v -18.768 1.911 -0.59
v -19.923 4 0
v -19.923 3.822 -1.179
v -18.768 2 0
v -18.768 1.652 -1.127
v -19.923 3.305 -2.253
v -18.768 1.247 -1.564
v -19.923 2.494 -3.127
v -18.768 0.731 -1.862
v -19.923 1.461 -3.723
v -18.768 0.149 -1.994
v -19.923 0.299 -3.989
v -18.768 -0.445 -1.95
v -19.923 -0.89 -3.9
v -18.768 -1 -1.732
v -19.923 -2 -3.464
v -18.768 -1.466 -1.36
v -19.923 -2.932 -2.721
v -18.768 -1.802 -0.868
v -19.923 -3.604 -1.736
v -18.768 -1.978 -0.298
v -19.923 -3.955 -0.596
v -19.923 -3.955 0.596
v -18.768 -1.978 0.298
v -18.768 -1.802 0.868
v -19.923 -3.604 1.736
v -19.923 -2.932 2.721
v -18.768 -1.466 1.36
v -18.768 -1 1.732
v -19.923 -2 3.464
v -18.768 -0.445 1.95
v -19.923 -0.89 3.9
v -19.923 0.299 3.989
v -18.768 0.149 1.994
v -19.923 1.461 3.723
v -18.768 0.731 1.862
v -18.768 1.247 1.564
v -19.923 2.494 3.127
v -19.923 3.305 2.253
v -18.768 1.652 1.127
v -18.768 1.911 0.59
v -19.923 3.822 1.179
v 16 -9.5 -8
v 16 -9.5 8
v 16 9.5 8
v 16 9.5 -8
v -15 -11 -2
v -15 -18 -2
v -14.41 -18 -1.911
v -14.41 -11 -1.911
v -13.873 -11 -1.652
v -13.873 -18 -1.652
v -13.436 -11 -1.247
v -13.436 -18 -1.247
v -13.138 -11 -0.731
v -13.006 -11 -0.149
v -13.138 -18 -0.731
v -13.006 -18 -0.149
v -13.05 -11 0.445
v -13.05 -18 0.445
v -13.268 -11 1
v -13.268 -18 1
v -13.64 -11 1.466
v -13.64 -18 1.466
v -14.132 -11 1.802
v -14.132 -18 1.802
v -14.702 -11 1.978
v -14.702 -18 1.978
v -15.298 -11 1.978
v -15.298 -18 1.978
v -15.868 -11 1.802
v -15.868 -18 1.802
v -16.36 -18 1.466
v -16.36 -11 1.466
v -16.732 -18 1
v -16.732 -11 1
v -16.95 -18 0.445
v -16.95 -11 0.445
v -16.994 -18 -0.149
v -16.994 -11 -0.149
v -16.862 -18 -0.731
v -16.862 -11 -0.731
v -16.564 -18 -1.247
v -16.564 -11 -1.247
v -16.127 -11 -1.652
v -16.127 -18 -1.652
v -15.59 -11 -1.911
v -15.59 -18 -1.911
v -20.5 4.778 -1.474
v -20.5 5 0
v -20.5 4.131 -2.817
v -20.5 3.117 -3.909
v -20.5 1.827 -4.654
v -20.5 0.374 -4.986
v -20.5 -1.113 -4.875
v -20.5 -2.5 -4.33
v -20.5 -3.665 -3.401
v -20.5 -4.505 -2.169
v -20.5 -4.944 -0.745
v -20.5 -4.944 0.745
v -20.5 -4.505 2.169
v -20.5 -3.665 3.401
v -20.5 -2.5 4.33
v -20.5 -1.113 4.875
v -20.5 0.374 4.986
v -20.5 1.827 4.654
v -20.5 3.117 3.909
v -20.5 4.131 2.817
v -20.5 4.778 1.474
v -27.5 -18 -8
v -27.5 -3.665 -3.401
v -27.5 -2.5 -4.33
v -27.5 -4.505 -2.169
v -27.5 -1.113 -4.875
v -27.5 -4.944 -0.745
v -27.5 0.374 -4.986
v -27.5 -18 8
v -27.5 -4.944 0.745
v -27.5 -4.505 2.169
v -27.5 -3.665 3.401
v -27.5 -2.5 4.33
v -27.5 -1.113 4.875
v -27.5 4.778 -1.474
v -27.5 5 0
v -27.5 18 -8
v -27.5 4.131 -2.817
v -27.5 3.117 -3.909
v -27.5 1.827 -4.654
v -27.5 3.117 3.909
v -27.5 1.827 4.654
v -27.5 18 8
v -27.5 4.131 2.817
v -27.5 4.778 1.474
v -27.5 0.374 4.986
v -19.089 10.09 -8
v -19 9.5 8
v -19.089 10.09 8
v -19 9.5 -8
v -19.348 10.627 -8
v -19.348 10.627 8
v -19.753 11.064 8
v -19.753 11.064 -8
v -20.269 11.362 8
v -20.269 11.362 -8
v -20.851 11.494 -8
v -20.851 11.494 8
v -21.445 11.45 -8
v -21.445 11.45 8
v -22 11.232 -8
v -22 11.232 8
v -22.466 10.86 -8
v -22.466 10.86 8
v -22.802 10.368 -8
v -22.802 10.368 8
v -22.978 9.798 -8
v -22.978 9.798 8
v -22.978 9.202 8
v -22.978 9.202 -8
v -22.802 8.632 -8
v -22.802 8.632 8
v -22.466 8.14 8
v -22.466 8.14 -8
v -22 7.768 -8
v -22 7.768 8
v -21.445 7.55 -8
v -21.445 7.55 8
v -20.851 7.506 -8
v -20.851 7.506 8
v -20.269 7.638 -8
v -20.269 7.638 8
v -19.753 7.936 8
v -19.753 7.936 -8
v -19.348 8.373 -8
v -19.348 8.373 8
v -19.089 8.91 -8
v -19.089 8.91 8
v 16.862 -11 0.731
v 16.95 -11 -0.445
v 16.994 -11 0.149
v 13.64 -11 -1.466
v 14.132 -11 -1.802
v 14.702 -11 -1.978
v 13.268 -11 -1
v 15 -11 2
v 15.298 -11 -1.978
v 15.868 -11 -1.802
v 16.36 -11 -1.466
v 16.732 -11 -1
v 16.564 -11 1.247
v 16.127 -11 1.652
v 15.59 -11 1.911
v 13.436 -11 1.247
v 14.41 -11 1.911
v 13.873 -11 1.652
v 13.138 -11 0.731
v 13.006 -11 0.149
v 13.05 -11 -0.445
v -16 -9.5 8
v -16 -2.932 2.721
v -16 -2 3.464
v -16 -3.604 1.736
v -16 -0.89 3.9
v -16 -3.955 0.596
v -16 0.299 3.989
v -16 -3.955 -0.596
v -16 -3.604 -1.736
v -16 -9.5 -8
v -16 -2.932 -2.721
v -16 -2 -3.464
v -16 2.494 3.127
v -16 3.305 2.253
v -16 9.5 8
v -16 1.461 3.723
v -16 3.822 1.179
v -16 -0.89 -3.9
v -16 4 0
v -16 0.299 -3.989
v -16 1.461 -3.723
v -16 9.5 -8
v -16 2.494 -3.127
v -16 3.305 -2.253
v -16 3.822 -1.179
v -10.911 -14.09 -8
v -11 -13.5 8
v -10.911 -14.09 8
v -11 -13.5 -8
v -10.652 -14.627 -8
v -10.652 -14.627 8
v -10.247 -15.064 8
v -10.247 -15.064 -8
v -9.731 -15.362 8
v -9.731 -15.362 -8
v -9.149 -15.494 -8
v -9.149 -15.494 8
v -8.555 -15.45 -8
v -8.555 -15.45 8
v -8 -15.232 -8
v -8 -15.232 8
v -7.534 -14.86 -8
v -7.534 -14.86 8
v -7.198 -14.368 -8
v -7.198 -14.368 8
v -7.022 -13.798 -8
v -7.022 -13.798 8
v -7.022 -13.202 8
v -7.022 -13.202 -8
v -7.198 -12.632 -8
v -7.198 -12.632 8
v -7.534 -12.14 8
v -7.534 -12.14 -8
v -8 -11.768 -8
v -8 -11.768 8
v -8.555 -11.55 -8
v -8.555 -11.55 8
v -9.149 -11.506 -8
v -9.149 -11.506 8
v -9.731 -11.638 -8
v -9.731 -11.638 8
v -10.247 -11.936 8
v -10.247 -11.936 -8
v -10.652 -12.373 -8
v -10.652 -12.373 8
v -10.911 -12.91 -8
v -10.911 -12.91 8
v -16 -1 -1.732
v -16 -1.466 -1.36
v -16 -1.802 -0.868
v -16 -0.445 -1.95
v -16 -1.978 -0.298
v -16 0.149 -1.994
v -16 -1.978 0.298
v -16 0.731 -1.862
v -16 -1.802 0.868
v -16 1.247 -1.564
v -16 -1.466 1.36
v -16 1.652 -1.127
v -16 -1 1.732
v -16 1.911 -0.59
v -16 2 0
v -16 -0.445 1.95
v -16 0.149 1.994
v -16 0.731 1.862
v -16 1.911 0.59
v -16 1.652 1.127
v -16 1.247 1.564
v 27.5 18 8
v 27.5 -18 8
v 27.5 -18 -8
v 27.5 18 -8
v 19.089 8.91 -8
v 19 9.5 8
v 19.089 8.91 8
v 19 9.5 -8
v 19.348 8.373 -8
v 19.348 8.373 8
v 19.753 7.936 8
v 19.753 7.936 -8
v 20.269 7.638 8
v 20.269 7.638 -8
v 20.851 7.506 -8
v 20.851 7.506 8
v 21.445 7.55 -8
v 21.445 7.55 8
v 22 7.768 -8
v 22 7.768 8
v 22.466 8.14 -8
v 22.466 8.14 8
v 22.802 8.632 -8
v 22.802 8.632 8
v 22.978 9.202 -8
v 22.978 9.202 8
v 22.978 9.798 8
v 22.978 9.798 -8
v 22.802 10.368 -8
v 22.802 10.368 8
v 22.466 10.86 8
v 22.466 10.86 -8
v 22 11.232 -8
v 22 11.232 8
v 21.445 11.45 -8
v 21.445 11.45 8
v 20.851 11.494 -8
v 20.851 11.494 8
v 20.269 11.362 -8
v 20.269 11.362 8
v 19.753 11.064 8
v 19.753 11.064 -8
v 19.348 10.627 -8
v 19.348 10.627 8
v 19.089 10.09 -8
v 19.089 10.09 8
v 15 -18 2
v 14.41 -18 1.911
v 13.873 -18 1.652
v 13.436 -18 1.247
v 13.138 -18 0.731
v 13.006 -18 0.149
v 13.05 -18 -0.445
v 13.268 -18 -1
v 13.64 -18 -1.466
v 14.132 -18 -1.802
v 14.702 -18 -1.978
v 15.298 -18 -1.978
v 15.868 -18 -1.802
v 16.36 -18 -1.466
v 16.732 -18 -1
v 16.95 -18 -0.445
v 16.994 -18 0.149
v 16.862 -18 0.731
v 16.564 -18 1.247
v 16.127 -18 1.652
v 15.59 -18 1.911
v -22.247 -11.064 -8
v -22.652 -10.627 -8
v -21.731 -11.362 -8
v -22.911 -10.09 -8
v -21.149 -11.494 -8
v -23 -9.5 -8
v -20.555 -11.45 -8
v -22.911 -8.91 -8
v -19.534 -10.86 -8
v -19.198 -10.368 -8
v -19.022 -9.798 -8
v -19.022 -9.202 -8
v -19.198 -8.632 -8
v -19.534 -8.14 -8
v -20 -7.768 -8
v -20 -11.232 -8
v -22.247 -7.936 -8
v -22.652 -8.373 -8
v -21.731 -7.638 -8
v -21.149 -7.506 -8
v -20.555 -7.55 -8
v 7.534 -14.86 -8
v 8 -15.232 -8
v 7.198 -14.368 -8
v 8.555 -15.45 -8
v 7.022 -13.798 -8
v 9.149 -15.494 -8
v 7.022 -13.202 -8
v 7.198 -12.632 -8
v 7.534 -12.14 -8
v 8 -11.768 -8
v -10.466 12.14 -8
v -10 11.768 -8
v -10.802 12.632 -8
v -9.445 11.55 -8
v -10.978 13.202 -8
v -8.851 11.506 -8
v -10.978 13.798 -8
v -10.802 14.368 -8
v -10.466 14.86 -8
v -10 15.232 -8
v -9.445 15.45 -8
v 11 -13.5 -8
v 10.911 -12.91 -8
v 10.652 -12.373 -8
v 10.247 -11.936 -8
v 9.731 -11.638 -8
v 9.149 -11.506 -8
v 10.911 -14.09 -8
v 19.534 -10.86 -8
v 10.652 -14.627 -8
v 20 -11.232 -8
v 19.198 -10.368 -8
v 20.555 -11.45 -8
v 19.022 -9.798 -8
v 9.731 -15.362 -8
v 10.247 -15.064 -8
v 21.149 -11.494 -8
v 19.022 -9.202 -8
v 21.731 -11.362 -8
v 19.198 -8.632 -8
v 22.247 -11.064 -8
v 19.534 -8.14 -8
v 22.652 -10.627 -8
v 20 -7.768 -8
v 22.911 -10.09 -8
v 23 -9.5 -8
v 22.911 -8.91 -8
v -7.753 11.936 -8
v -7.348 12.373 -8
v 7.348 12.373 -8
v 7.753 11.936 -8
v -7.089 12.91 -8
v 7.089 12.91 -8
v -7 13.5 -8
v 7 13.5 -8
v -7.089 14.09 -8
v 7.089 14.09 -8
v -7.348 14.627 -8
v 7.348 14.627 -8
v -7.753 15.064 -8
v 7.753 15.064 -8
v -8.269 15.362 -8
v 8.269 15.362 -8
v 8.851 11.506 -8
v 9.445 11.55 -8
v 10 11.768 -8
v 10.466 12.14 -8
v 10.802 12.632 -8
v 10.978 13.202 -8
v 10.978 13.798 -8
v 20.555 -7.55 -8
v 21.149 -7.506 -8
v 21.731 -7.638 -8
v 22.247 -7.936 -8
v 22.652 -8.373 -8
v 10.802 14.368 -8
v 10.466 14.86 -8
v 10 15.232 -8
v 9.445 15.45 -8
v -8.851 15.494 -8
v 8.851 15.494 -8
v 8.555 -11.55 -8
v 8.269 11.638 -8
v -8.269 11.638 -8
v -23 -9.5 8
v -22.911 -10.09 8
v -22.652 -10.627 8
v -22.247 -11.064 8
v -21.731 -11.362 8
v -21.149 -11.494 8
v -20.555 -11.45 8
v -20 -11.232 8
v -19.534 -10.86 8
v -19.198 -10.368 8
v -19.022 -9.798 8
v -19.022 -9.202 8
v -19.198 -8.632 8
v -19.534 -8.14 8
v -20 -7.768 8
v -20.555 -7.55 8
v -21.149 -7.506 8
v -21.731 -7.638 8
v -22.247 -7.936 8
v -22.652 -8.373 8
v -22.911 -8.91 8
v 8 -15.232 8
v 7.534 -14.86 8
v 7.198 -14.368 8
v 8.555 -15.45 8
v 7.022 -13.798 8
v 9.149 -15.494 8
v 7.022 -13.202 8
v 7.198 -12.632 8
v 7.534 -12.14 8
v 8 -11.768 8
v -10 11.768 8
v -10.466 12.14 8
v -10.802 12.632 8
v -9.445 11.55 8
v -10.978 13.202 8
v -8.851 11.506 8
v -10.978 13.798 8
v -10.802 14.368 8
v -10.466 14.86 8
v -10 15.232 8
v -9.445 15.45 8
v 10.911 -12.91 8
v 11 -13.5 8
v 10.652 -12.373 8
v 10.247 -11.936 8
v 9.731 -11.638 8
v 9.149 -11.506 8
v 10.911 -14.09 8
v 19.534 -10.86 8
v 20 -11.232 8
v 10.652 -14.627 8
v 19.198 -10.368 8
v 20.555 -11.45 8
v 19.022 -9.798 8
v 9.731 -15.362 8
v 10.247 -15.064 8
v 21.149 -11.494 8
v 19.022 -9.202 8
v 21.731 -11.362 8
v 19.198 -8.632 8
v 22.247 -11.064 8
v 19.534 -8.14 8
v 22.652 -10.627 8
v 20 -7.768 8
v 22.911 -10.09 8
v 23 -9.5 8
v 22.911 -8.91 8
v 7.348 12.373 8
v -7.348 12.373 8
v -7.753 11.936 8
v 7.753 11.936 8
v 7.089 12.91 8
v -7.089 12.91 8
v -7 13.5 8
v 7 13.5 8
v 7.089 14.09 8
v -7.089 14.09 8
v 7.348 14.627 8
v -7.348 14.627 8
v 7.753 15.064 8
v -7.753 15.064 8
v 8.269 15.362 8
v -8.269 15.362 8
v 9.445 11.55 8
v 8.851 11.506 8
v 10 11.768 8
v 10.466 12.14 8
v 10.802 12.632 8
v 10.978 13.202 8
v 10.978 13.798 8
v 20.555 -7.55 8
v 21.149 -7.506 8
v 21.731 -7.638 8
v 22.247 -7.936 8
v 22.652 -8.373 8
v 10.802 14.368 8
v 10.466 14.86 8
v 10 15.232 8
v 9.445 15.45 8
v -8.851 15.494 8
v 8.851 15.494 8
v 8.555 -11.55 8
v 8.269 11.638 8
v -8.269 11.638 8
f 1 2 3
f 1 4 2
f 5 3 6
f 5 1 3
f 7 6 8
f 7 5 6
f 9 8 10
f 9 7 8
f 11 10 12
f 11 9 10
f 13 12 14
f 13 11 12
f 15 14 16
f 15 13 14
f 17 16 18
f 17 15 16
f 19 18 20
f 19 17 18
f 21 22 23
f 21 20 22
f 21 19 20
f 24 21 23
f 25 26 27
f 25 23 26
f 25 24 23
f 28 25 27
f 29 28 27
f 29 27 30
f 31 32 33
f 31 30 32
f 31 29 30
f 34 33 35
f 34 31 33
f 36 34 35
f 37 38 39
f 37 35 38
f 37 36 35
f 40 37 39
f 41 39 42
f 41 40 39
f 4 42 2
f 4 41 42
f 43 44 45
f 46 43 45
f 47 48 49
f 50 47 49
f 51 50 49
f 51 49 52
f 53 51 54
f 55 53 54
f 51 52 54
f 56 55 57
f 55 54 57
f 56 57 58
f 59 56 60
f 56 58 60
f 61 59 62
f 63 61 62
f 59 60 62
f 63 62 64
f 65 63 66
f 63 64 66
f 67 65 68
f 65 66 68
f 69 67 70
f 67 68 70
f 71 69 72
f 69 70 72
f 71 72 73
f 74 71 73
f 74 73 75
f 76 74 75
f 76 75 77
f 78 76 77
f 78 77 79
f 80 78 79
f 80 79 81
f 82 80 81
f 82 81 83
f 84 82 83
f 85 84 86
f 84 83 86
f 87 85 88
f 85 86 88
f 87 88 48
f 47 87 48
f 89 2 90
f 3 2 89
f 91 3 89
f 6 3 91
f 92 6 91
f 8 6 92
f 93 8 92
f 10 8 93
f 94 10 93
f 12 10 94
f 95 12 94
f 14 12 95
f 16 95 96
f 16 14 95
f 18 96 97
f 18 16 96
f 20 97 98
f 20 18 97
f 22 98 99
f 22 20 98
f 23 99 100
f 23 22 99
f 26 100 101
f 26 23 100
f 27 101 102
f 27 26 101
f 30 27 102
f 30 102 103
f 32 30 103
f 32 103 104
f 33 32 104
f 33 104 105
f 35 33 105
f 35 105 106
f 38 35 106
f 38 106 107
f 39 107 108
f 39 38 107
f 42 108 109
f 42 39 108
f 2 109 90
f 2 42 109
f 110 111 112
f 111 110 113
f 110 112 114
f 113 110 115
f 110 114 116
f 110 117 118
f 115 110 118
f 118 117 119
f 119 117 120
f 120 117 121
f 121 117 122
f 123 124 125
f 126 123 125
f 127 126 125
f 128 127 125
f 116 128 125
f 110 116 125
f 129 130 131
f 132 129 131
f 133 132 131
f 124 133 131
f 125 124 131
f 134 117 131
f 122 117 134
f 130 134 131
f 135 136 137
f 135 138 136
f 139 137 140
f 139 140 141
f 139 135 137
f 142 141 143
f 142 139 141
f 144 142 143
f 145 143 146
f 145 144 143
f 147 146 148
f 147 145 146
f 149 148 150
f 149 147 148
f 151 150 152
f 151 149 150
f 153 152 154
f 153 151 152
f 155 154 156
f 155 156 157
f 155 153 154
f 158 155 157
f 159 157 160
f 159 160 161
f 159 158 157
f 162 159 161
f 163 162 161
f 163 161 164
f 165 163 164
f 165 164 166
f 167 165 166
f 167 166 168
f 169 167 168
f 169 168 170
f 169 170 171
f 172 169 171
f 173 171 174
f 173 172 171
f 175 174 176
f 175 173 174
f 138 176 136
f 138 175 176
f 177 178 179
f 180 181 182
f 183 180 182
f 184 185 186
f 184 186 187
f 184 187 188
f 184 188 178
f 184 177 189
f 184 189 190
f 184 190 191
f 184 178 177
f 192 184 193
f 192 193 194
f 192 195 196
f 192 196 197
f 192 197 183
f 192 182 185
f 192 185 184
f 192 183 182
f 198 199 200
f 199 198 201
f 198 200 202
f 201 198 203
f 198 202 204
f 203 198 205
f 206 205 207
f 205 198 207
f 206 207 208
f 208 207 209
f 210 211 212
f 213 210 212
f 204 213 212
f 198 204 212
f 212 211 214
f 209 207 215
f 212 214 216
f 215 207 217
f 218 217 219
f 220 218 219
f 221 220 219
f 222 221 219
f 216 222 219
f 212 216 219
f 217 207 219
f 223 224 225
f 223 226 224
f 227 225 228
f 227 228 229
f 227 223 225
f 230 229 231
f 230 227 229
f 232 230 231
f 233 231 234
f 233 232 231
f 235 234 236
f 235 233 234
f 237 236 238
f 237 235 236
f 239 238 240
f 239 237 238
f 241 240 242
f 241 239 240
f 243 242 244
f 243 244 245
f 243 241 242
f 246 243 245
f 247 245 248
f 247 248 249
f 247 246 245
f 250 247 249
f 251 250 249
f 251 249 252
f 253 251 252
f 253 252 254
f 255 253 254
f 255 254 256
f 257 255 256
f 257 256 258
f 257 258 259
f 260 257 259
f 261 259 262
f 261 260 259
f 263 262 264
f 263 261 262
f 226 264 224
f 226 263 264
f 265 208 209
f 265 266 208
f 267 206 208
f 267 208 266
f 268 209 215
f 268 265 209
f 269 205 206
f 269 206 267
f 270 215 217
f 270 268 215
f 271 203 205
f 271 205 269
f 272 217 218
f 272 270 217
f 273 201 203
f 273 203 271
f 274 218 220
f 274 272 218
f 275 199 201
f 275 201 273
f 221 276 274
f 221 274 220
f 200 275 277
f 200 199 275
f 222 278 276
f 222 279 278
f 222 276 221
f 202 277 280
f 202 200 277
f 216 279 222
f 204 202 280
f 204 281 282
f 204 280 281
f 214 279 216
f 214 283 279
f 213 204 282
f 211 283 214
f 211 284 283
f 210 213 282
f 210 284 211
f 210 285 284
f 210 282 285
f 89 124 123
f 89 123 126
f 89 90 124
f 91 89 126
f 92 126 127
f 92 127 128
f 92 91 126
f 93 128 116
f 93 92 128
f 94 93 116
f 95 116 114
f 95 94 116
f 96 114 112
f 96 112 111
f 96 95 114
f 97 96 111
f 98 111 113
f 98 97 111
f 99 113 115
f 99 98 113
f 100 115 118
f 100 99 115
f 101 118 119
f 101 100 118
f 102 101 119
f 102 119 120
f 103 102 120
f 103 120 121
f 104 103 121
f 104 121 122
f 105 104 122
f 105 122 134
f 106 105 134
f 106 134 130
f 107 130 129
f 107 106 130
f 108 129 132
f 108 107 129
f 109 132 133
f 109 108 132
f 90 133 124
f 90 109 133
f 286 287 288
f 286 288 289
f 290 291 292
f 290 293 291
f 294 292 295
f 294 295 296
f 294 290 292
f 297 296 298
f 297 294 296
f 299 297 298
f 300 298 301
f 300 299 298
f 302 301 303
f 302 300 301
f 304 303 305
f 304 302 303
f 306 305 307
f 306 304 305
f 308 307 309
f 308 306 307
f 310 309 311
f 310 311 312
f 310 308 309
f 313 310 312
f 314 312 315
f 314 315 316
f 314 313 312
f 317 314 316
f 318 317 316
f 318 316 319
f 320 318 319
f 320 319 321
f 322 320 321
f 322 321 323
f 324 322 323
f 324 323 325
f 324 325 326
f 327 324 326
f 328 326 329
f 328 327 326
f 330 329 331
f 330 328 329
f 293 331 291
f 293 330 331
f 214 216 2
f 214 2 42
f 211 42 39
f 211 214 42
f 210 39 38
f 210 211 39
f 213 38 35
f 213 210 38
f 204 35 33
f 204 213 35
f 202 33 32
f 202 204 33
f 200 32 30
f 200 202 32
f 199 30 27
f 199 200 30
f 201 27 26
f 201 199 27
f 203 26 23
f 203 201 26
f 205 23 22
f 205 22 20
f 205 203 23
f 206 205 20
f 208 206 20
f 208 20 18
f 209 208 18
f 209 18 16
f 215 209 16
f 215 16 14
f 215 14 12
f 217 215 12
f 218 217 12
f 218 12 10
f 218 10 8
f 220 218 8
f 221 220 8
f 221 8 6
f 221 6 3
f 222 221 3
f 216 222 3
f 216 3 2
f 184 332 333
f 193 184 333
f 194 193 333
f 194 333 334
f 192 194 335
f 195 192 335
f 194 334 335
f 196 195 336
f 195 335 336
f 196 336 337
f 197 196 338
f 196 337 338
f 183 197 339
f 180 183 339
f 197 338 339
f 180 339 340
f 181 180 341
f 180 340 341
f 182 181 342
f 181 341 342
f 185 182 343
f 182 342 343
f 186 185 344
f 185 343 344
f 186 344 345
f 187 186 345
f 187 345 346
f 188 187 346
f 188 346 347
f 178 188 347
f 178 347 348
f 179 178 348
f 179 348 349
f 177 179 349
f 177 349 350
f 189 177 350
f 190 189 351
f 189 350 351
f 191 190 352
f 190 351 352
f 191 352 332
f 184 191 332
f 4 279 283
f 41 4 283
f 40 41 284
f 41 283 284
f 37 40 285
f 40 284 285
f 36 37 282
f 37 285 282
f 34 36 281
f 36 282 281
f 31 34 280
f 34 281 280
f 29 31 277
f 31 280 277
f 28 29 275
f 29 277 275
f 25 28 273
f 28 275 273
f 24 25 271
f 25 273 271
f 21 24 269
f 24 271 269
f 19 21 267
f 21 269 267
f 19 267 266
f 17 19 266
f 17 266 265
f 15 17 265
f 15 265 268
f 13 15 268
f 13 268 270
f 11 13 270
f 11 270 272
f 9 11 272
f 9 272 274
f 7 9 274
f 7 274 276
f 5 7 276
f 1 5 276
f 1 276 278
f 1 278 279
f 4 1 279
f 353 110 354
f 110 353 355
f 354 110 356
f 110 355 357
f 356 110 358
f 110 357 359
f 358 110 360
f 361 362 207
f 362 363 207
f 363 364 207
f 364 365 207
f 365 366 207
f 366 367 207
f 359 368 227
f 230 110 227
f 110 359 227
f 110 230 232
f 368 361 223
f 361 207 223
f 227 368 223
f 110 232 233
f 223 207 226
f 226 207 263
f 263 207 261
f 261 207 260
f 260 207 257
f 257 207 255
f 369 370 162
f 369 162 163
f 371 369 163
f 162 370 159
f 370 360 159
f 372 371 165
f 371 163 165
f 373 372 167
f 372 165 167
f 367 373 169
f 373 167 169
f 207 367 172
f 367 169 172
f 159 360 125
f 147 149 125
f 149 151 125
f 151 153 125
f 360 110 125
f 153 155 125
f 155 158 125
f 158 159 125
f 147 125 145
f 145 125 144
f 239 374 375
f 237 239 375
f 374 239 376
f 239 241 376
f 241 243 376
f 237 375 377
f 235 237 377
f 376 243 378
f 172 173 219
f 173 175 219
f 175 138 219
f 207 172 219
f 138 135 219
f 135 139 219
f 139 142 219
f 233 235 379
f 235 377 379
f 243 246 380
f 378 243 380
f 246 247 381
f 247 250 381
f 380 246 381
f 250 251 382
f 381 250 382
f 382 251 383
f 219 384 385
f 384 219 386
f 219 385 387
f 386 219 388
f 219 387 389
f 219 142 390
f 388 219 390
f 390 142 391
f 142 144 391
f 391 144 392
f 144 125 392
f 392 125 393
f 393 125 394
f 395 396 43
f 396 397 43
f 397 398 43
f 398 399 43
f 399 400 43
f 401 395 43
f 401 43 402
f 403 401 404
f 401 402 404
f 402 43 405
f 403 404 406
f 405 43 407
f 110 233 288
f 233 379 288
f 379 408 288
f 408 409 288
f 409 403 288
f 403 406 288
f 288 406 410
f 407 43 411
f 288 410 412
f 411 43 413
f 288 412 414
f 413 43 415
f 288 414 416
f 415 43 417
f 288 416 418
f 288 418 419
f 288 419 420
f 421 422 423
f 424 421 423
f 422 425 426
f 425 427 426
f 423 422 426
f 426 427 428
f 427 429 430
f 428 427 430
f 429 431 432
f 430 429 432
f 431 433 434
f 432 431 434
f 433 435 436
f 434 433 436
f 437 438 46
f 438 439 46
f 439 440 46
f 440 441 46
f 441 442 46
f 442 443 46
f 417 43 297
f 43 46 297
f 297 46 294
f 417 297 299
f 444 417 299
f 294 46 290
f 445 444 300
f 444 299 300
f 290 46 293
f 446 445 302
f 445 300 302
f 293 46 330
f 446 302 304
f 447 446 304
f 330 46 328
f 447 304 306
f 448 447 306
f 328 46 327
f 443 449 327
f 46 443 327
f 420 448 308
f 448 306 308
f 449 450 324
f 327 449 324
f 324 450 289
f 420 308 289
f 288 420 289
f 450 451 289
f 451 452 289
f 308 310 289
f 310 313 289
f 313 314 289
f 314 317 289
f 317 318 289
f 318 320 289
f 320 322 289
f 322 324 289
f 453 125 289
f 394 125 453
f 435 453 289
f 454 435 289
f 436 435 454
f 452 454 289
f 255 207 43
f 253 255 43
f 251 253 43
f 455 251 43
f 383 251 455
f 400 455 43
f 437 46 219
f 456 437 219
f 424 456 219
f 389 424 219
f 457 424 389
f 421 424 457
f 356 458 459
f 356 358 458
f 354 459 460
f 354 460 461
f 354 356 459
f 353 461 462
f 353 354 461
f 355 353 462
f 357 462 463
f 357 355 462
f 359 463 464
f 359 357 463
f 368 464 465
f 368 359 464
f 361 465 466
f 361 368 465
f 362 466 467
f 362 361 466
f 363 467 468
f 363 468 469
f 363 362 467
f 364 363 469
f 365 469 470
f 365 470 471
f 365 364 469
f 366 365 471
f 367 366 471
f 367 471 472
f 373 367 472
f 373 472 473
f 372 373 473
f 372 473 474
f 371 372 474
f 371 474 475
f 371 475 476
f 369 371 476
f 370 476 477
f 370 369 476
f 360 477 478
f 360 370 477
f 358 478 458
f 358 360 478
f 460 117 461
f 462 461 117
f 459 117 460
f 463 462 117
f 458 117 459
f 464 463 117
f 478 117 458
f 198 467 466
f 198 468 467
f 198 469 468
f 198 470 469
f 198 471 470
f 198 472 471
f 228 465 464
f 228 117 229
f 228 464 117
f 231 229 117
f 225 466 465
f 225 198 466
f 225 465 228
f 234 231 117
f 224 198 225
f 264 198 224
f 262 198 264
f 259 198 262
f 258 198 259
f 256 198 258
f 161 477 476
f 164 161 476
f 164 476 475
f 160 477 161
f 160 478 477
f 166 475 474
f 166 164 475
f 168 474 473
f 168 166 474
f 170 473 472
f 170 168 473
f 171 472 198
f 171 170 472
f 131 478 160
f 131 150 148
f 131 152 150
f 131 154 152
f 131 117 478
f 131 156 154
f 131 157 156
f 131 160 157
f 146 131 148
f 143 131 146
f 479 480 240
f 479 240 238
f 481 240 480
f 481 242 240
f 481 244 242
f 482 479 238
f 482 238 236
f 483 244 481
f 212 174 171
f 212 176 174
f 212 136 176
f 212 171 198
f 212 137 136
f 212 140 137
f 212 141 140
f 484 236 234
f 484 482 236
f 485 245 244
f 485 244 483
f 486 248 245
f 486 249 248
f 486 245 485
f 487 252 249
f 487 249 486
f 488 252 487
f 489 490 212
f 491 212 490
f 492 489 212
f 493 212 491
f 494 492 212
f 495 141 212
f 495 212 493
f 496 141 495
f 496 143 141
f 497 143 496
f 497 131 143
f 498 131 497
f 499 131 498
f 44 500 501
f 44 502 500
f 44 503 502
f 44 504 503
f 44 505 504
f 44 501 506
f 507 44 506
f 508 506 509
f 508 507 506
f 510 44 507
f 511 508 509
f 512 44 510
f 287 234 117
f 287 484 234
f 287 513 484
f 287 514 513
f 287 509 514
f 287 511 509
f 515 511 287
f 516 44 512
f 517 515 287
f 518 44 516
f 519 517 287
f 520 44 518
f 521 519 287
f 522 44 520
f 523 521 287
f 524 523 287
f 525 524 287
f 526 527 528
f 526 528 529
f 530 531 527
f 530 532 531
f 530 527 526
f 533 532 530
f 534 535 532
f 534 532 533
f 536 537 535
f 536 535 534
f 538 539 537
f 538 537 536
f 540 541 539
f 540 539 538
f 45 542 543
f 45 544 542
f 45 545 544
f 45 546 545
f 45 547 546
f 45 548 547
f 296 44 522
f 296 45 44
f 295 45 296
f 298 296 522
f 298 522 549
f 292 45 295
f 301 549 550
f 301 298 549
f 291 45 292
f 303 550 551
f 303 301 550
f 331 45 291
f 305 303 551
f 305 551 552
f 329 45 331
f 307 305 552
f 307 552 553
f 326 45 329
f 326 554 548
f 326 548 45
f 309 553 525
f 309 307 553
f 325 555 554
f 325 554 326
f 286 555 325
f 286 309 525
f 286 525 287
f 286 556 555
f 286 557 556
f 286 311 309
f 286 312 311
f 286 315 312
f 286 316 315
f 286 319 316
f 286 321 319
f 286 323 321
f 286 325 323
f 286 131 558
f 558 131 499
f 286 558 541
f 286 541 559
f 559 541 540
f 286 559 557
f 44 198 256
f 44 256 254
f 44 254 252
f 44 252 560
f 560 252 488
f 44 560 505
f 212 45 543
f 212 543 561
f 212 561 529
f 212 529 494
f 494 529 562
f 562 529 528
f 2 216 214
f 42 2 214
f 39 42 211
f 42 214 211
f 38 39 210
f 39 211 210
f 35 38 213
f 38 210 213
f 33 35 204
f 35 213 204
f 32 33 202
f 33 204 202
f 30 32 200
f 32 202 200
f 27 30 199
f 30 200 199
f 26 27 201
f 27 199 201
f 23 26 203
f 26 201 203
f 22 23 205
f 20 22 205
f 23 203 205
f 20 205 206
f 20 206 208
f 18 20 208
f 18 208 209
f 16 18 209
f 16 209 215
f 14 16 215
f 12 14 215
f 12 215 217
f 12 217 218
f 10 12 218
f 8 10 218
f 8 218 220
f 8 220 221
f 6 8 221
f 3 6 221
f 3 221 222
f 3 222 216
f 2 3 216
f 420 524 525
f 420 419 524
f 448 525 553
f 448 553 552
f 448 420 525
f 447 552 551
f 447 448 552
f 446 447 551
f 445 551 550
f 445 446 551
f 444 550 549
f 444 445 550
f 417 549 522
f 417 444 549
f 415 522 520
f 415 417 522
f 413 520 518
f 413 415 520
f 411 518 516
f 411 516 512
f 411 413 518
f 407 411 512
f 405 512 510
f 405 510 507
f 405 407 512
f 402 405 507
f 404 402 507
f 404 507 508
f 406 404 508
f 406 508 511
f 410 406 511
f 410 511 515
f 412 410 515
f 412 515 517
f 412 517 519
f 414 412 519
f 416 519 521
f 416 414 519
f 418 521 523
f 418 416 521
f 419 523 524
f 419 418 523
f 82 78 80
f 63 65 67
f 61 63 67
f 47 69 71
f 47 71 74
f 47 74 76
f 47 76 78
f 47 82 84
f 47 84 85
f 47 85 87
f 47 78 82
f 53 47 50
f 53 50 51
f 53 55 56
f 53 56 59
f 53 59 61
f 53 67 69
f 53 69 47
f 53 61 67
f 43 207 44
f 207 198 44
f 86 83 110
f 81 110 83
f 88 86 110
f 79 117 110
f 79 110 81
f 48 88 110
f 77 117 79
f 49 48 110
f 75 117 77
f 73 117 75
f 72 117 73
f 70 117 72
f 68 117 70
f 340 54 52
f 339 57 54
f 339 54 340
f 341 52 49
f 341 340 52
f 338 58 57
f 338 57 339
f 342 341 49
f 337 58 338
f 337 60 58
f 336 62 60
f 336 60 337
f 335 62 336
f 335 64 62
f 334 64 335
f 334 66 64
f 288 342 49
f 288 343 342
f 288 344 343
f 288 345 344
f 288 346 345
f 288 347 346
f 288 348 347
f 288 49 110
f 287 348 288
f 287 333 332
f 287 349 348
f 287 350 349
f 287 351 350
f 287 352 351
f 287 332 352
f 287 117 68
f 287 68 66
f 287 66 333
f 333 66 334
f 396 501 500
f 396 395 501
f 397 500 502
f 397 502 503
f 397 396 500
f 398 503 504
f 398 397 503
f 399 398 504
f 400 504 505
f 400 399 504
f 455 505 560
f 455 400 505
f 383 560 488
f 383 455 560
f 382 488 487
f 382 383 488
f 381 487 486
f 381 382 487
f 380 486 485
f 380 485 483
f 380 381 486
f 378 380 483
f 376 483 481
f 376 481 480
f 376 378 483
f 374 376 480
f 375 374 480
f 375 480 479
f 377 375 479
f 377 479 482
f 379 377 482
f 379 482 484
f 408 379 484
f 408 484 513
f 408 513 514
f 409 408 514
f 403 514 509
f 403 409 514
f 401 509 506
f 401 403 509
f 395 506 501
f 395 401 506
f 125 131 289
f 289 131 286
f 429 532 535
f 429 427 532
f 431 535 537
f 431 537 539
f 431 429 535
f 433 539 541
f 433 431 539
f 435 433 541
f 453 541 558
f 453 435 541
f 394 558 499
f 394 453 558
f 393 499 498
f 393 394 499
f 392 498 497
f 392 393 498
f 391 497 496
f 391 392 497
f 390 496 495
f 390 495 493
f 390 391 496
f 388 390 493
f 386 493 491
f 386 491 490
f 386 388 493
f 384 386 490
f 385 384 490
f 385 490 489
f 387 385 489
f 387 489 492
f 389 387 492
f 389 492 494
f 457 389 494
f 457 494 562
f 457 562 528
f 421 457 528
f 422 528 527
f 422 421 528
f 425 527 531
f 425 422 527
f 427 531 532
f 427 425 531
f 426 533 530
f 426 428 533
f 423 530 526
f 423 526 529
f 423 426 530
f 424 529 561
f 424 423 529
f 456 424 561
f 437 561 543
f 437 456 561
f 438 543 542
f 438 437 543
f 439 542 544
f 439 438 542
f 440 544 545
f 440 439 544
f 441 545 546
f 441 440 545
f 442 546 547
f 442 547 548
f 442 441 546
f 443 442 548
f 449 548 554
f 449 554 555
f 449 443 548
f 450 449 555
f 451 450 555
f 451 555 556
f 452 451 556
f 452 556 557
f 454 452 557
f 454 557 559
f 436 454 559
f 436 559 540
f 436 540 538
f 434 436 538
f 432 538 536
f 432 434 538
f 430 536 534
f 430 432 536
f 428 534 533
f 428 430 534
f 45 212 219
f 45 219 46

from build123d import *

# Parameters (mm, degrees)
SKETCH1_W           = 55
SKETCH1_H           = 36
SKETCH1_R           = 2
SKETCH1_W_2         = 32
SKETCH1_H_2         = 19
BOSS_EXTRUDE1_DEPTH = 8
SKETCH2_R           = 2
CUT_EXTRUDE1_DEPTH  = 7
SKETCH3_R           = 4
CUT_EXTRUDE2_DEPTH  = 48.75196331
SKETCH3_5_R         = 4
SKETCH3_5_R_2       = 2
BOSS_EXTRUDE2_DEPTH = 4.5


with BuildPart() as part:
    # Sketch1 → Boss-Extrude1 (new, symmetric)
    with BuildSketch(Plane.XY):
        Rectangle(SKETCH1_W, SKETCH1_H)
        with Locations((-21, 9.5)):
            Circle(SKETCH1_R, mode=Mode.SUBTRACT)
        with Locations((-9, 13.5)):
            Circle(SKETCH1_R, mode=Mode.SUBTRACT)
        with Locations((-21, -9.5)):
            Circle(SKETCH1_R, mode=Mode.SUBTRACT)
        with Locations((-9, -13.5)):
            Circle(SKETCH1_R, mode=Mode.SUBTRACT)
        with Locations((9, -13.5)):
            Circle(SKETCH1_R, mode=Mode.SUBTRACT)
        with Locations((21, -9.5)):
            Circle(SKETCH1_R, mode=Mode.SUBTRACT)
        with Locations((9, 13.5)):
            Circle(SKETCH1_R, mode=Mode.SUBTRACT)
        with Locations((21, 9.5)):
            Circle(SKETCH1_R, mode=Mode.SUBTRACT)
        Rectangle(SKETCH1_W_2, SKETCH1_H_2, mode=Mode.SUBTRACT)
    extrude(amount=BOSS_EXTRUDE1_DEPTH, both=True)

    # Sketch2 → Cut-Extrude1 (cut)
    with BuildSketch(Plane.XZ.offset(18)):
        with Locations((-15, 0)):
            Circle(SKETCH2_R)
        with Locations((15, 0)):
            Circle(SKETCH2_R)
    extrude(amount=-CUT_EXTRUDE1_DEPTH, mode=Mode.SUBTRACT)

    # Sketch3 → Cut-Extrude2 (cut, through all)
    with BuildSketch(Plane(origin=(-16, 0, 0), x_dir=(0, 0, -1), z_dir=(1, 0, 0))):
        Circle(SKETCH3_R)
    extrude(amount=-CUT_EXTRUDE2_DEPTH, mode=Mode.SUBTRACT)


with BuildPart() as body_2:
    # Sketch3<5> → Boss-Extrude2 (new body)
    with BuildSketch(Plane(origin=(-16, 0, 0), x_dir=(0, 0, -1), z_dir=(1, 0, 0))):
        Circle(SKETCH3_5_R)
        Circle(SKETCH3_5_R_2, mode=Mode.SUBTRACT)
    extrude(amount=-BOSS_EXTRUDE2_DEPTH)


with BuildPart() as cut_revolve1_tool:
    # Sketch4 → Cut-Revolve1 (revolve)
    with BuildSketch(Plane.XY):
        Polygon((-27.5, 0), (-27.5, 5), (-20.5, 5), (-17.613248654, 0), align=None)
    revolve(axis=Axis((0, 0, 0), (-1, 0, 0)))


with BuildPart() as part_1:
    add(part.part)

    # Cut-Revolve1: cut by cut_revolve1_tool
    add(cut_revolve1_tool.part, mode=Mode.SUBTRACT)


with BuildPart() as body_2_1:
    add(body_2.part)

    # Cut-Revolve1: cut by cut_revolve1_tool
    add(cut_revolve1_tool.part, mode=Mode.SUBTRACT)


solid = Compound([part_1.part, body_2_1.part])
